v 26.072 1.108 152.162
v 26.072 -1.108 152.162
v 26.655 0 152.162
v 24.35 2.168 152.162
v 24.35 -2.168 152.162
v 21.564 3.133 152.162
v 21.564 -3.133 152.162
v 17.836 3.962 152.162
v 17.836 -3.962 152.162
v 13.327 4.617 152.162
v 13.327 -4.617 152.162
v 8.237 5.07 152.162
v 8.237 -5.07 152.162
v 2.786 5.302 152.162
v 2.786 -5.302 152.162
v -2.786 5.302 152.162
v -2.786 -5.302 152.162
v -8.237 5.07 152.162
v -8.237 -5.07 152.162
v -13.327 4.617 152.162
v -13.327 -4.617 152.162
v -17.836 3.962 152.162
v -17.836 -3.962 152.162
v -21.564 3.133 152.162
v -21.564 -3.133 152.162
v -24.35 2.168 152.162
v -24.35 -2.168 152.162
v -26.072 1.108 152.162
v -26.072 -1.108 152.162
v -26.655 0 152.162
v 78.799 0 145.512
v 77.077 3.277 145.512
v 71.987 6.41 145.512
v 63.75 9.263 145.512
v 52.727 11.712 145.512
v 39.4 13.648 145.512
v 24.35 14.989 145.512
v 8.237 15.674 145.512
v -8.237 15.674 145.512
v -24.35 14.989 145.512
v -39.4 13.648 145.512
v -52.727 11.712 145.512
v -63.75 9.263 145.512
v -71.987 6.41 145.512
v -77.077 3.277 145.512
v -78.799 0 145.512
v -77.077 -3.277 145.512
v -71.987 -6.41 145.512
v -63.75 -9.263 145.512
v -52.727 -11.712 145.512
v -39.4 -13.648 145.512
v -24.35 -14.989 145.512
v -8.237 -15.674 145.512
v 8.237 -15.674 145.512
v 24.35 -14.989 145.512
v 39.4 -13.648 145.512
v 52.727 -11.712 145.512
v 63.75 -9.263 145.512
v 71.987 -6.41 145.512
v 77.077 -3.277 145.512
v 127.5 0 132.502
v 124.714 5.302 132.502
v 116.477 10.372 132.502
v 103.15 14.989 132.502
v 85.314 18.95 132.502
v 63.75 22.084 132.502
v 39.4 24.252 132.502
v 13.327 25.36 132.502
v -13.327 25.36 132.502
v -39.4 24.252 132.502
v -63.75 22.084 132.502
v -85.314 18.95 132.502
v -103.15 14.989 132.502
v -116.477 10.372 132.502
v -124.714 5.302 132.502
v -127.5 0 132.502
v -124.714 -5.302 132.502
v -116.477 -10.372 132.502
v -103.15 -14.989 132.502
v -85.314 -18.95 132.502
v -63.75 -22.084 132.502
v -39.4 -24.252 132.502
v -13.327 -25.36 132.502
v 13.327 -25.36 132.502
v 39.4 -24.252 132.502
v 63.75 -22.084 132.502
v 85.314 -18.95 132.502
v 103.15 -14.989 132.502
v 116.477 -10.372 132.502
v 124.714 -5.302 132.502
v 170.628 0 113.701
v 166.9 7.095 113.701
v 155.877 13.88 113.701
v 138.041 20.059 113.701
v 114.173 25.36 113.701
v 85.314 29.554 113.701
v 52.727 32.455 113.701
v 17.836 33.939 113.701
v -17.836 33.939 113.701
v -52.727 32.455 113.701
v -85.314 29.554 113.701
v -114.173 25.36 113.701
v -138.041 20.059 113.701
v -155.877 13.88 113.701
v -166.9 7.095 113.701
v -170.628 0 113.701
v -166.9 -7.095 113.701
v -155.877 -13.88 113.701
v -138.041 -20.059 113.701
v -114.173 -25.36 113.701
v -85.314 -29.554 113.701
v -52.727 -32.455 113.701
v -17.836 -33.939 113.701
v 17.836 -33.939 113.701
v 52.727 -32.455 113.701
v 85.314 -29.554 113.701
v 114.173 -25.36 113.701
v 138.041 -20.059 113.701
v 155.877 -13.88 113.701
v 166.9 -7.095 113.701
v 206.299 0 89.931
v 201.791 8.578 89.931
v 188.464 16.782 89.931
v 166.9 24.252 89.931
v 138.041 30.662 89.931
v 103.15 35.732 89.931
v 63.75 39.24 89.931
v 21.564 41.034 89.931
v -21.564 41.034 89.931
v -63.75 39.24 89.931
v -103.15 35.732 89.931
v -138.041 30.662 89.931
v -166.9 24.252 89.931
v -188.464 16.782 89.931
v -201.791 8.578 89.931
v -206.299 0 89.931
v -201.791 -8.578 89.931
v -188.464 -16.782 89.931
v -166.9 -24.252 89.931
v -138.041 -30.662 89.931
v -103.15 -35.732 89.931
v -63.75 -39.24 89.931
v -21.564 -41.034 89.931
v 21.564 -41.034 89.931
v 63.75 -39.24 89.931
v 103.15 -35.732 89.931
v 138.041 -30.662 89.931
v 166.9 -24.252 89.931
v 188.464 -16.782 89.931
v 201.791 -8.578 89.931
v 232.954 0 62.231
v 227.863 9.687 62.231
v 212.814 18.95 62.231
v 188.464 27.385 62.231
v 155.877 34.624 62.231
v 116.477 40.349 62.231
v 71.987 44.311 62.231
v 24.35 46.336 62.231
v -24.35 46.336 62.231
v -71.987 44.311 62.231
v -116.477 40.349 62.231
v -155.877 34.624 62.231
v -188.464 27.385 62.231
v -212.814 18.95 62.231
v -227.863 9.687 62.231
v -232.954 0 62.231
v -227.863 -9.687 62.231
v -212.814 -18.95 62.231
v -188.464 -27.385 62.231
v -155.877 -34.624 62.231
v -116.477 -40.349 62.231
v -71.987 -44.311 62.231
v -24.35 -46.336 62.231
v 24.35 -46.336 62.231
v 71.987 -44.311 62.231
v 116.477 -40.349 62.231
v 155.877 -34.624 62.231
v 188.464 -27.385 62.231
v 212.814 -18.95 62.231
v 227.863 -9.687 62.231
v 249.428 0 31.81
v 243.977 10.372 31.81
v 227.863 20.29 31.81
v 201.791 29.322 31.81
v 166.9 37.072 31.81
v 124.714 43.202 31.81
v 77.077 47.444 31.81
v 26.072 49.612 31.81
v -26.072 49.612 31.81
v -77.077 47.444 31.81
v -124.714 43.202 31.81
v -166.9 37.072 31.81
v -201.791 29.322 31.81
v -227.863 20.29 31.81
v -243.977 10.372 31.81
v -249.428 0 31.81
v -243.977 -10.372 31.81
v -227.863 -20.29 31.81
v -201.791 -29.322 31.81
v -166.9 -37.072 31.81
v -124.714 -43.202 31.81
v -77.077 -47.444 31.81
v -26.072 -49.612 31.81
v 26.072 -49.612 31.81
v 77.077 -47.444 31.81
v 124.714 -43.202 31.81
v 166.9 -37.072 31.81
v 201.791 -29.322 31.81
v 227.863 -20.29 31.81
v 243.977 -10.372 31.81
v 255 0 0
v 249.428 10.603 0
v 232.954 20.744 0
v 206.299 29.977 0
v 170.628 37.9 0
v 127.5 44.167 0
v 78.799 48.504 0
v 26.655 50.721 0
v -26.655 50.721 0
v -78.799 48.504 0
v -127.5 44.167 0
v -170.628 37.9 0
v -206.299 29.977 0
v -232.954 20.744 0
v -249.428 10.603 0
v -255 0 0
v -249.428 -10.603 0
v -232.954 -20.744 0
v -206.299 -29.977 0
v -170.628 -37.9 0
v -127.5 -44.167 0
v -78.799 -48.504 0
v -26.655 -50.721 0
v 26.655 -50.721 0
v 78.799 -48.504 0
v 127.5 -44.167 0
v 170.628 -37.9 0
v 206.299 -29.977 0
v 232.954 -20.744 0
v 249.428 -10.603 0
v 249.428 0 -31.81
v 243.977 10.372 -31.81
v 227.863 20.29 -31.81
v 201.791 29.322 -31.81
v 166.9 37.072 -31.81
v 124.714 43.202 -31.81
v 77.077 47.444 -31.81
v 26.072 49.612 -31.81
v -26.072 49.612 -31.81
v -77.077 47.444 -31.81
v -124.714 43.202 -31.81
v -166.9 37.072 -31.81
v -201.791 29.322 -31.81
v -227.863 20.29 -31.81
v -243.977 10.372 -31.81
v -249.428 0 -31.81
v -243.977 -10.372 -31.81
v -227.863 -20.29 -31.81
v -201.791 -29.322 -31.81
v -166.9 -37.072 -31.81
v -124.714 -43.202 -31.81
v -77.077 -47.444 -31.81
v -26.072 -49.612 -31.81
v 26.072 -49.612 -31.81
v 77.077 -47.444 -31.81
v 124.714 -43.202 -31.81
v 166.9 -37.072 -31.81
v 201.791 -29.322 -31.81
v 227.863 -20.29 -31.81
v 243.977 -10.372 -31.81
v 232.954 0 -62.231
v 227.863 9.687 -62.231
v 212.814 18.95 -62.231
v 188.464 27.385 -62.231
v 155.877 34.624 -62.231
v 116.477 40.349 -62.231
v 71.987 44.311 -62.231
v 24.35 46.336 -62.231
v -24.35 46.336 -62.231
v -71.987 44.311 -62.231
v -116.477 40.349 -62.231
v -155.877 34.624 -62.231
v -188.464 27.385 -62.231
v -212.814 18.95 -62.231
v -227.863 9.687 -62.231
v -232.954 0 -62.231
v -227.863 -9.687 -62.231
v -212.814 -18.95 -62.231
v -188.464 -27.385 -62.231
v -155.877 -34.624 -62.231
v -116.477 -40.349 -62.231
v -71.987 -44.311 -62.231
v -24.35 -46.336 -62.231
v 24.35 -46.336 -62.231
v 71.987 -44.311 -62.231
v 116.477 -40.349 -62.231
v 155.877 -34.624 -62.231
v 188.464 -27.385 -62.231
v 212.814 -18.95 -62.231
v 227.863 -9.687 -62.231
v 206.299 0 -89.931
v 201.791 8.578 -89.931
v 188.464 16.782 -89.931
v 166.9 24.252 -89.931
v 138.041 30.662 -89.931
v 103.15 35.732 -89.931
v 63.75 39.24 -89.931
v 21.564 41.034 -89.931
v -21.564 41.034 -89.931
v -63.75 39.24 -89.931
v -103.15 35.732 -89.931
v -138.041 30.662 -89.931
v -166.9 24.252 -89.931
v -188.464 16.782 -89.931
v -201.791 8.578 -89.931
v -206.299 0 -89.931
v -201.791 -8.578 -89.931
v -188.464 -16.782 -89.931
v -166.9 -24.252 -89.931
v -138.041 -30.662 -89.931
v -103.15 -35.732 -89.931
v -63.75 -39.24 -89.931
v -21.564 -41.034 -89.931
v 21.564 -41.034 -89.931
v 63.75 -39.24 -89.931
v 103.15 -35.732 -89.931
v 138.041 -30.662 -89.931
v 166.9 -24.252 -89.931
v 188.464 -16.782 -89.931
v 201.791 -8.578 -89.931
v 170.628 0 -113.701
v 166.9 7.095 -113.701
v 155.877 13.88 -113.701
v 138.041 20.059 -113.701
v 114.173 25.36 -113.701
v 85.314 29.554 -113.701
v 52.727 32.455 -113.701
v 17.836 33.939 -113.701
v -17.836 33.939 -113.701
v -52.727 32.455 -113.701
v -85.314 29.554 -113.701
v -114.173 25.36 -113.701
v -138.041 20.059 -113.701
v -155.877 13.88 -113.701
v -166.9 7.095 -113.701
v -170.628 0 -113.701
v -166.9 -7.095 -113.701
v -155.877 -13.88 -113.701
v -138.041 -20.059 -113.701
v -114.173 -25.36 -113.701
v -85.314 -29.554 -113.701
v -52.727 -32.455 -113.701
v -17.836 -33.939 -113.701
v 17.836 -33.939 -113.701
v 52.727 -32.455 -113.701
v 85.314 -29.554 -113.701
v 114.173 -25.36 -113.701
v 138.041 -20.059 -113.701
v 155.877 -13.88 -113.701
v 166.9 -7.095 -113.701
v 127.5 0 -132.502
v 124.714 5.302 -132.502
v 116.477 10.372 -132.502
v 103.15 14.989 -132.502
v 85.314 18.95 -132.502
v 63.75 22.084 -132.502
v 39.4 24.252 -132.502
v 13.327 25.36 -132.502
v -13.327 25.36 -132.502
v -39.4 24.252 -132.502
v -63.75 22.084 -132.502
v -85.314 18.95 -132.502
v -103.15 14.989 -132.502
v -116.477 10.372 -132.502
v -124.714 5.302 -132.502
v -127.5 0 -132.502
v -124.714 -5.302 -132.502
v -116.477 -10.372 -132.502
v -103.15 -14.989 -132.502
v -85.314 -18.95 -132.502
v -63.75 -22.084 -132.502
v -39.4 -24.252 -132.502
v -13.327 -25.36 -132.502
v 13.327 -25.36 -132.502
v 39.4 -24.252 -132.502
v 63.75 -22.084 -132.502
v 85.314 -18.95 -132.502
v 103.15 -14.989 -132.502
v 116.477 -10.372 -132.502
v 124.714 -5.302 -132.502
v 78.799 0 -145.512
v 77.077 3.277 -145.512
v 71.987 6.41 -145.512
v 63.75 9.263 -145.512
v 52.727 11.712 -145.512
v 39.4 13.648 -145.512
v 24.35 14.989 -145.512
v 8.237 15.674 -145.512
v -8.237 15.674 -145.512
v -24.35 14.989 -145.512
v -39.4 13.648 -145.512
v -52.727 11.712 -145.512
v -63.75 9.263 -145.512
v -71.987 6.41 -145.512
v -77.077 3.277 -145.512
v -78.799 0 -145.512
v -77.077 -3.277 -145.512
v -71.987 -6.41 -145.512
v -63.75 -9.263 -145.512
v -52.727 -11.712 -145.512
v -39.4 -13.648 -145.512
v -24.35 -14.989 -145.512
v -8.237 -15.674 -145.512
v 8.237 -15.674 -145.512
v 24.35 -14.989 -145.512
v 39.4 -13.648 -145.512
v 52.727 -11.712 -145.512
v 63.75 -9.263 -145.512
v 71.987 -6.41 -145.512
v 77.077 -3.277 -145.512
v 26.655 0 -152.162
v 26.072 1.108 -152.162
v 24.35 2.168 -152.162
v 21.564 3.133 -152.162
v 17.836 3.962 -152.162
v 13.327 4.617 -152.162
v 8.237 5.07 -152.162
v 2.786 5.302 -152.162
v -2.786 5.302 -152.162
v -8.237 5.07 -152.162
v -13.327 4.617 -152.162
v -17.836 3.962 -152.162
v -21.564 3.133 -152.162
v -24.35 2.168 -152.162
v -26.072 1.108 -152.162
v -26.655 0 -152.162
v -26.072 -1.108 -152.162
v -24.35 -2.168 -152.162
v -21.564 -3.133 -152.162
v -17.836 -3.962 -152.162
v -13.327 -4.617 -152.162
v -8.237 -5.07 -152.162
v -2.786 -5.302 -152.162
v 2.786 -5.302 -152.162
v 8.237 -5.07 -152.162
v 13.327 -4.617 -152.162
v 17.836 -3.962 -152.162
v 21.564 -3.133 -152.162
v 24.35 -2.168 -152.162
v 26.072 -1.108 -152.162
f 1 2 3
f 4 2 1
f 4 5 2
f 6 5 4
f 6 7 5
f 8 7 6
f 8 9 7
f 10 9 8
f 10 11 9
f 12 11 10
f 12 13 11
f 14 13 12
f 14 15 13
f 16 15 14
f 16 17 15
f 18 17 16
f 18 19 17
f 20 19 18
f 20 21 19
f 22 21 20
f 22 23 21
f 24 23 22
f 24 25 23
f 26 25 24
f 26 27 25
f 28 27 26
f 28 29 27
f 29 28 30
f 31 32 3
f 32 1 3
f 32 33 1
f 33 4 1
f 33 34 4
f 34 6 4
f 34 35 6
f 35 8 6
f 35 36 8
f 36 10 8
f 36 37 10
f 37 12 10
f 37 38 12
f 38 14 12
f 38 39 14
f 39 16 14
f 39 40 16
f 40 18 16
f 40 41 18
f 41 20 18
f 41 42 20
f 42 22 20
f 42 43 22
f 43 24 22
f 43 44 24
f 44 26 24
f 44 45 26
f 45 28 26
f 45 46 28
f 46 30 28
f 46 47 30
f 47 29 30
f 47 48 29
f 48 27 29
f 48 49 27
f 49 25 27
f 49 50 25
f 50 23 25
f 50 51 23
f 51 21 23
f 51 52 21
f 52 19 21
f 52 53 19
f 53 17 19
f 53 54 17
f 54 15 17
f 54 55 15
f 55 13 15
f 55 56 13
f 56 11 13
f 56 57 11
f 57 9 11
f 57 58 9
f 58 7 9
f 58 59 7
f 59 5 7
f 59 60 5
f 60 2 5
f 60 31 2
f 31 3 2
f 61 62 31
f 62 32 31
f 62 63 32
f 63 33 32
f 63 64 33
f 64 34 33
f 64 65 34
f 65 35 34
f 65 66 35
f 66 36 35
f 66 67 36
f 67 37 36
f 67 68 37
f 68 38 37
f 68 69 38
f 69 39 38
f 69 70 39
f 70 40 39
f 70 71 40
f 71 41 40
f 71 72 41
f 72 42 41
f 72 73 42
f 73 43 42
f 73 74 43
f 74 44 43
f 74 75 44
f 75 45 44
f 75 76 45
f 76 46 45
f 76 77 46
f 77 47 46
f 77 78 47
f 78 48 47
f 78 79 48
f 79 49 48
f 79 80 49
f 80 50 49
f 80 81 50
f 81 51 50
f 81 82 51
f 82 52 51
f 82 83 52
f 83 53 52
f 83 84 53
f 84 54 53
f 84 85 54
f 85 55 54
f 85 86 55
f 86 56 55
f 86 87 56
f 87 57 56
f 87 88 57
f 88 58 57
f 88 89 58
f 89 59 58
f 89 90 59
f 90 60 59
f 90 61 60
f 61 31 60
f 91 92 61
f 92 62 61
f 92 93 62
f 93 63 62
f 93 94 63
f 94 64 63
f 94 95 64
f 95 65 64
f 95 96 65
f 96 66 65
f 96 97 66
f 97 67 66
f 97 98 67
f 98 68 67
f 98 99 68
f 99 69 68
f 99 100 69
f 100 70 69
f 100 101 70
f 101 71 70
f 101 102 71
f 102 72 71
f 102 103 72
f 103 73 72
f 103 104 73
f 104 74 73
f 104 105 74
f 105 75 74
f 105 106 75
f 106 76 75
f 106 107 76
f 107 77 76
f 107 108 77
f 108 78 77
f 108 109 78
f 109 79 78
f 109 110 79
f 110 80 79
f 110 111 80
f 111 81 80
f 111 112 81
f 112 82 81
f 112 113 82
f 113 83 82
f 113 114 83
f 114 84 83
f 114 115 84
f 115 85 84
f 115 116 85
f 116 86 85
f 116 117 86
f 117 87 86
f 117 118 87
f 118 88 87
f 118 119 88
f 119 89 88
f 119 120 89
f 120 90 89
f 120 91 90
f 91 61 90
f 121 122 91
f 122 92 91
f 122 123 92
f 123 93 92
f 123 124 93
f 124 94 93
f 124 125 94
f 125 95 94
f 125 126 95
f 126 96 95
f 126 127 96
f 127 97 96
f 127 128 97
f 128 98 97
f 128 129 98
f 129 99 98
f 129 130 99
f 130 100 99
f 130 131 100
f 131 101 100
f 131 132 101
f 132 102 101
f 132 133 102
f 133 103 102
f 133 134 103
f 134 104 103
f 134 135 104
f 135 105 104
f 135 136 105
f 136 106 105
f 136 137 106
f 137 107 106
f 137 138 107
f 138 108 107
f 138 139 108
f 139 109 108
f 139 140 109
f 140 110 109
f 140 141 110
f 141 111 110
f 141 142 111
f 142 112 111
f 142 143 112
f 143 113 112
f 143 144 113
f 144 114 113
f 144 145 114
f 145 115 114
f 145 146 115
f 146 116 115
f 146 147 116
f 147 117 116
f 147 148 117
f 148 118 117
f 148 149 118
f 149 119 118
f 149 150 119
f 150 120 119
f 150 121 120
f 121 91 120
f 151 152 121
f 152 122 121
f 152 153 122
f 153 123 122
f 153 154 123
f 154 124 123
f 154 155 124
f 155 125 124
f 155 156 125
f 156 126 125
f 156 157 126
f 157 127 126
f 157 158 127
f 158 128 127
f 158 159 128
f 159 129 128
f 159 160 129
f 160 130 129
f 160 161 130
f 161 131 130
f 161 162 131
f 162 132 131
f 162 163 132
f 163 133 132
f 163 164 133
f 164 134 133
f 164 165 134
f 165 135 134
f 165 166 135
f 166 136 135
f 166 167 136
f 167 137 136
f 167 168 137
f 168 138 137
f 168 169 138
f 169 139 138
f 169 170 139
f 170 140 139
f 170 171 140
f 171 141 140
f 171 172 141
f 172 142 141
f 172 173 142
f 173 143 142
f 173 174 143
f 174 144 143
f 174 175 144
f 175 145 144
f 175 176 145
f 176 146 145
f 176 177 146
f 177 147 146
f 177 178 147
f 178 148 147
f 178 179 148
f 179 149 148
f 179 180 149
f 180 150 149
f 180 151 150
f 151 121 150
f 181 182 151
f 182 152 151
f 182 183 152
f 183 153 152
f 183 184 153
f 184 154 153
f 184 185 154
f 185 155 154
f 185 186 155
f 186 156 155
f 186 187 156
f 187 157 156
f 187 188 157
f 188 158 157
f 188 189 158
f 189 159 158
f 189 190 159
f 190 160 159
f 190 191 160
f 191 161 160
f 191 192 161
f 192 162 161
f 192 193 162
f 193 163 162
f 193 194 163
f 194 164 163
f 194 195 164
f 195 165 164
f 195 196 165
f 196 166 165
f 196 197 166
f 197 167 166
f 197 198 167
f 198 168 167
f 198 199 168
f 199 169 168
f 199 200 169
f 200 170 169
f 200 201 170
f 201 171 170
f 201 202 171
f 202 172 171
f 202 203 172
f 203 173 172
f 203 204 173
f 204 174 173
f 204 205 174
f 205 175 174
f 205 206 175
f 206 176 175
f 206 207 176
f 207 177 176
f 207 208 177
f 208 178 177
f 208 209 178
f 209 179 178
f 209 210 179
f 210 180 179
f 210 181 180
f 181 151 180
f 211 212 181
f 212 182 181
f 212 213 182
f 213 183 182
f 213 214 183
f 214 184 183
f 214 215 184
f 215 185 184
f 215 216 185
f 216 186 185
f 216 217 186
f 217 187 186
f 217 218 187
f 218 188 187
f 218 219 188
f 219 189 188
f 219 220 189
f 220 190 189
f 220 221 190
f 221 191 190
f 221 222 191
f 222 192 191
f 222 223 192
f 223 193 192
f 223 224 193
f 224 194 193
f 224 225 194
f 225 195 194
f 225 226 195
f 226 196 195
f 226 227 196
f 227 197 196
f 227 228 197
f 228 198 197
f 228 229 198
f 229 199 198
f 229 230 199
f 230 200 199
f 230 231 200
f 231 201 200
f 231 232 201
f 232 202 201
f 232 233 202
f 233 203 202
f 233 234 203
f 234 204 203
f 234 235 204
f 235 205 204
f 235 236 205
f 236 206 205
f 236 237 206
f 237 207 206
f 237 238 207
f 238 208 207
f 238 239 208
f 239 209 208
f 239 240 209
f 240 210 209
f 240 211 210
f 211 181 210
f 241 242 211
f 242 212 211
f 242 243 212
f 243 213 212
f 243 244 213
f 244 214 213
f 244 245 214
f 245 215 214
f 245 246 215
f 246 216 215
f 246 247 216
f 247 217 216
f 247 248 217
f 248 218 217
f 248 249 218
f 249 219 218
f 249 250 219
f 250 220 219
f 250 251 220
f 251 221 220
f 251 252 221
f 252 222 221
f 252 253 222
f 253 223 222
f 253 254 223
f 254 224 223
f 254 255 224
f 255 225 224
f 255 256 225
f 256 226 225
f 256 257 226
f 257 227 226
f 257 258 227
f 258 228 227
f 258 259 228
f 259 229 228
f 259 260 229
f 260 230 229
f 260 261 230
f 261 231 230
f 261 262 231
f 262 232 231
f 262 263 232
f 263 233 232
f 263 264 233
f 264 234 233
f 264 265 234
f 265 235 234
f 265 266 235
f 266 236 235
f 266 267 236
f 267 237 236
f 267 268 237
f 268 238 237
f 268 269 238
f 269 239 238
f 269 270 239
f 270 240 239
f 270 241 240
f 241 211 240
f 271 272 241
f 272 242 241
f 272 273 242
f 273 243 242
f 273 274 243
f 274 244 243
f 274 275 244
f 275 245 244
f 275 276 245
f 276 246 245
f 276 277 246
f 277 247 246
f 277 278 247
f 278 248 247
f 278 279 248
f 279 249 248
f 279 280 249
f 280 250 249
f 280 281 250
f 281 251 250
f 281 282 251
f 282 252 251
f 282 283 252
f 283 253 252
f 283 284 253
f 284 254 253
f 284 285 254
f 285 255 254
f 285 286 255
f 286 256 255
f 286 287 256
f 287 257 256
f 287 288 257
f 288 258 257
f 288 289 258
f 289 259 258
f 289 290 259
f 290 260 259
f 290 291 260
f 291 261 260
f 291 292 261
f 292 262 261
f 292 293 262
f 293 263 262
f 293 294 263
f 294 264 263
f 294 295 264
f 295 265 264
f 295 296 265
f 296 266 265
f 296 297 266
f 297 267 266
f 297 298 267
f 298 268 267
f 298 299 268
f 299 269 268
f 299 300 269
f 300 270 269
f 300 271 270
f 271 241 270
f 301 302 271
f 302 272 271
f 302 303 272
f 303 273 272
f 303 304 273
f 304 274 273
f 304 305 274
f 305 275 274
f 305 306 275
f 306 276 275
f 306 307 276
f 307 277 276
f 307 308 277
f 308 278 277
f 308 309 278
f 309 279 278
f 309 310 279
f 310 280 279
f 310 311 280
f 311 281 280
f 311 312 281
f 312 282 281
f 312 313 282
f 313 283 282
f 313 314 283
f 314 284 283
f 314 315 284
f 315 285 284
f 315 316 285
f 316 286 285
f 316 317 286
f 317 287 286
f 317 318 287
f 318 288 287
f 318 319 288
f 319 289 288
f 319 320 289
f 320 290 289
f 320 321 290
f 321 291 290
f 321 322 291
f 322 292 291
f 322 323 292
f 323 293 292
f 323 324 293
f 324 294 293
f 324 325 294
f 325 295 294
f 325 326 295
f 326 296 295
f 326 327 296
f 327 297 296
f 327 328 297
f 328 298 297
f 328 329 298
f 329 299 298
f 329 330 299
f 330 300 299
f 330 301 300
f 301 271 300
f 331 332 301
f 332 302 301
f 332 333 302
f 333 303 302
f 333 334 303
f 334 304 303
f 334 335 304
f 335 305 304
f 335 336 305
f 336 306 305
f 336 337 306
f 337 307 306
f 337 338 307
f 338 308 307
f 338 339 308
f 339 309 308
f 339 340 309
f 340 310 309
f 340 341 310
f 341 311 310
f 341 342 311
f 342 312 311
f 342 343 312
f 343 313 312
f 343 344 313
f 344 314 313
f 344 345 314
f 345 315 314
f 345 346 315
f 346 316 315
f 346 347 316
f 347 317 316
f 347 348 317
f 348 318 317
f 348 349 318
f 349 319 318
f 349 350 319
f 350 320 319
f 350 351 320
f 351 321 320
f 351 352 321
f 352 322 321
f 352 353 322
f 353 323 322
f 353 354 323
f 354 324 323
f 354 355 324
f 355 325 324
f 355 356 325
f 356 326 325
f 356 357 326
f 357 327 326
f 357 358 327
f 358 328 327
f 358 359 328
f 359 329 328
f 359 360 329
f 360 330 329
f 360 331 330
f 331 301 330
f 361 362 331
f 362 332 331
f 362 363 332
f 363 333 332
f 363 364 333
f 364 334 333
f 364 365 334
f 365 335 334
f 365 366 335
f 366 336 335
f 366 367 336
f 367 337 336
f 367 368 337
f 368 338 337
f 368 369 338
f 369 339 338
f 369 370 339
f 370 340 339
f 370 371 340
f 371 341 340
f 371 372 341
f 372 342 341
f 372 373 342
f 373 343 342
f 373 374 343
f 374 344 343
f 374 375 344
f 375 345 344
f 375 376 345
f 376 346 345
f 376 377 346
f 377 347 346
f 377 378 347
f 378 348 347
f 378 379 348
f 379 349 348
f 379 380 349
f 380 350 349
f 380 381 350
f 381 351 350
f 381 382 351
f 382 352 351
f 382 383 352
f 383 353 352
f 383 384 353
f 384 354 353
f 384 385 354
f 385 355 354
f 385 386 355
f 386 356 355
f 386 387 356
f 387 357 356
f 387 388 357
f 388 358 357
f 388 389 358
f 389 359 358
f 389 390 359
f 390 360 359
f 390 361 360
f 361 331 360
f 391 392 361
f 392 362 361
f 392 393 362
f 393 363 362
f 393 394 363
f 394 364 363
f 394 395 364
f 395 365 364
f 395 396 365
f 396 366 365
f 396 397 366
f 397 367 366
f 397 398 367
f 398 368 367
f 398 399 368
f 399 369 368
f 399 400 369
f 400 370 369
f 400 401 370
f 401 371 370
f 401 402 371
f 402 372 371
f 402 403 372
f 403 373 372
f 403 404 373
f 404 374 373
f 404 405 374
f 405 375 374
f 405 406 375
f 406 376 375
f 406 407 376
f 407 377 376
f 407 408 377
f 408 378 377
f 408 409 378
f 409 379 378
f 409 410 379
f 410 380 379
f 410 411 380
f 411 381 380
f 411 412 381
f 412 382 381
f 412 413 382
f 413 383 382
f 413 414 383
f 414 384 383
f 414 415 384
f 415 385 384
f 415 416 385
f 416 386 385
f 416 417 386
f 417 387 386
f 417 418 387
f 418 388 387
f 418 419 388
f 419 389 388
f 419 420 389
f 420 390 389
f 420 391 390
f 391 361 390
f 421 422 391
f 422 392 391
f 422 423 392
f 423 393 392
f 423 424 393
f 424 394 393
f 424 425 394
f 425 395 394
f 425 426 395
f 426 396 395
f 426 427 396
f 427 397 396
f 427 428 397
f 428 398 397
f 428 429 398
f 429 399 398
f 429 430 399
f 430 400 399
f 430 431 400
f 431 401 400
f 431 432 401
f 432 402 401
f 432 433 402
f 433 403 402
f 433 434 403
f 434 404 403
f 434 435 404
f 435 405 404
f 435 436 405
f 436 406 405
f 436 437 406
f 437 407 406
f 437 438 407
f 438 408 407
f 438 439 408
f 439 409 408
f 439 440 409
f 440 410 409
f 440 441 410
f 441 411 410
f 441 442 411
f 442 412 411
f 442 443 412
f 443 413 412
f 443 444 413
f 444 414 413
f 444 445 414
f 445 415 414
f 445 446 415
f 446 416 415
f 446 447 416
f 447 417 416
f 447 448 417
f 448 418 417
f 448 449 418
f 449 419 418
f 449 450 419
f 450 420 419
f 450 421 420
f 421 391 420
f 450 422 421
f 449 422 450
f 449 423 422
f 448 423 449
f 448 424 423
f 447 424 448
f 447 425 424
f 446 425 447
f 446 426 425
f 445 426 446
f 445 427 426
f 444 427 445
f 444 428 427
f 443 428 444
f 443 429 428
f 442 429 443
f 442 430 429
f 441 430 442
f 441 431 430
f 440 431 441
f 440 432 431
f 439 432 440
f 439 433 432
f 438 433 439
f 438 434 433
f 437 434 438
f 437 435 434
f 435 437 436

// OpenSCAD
// Generated by SolidPython 1.0.1 on 2020-07-29 00:46:51


scale(v = [15, 3, 9]) {
	sphere(r = 17);
}
/***********************************************
*********      SolidPython code:      **********
************************************************
 
# import packages: SolidPython
from solid import *
from solid.utils import *
from itertools import chain, combinations, permutations


class Resize:

    def __init__(self, scad_file):
        self.scad_file = scad_file
        #self.scad_file = import_scad(scad_file)
        # cone/cylinder param:
        self.r1 = 0
        self.r2 = 0
        self.h = 0
        # rectangular prism param:
        self.w = 0
        self.l = 0
        # ellipse param:
        self.r = 0

    # import OpenScad code (file name corresponds to shape)


    # classify shape + parameters
    def assign(self, param1, param2, param3):
        if self.scad_file == 'cone.scad':
            self.r1 = param1
            self.r2 = param2
            self.h = param3
        elif self.scad_file == 'cylinder.scad':
            self.r1 = param1
            self.r2 = param2
            self.h = param3
        elif self.scad_file == 'rectangularPrism.scad':
            self.h = param1
            self.l = param2
            self.w = param3
        else:
            self.r = param1
            self.h = param2

    # resize parameters
    def iterate(self):
        x = range(3, 20, 2)
        i = 1
        if self.scad_file == 'cone.scad':
            tempList = list(permutations(x, 2))
            for temp in tempList:
                param1 = temp[0]
                param2 = temp[1]
                filepath = 'produced_scad_files/' + 'cone' + str(param1) + '_' + str(param2) + '_' + '.scad'
                scad_render_to_file(cylinder(h=param1, r1=param2, r2=0), filepath)

        elif self.scad_file == 'cylinder.scad':
            tempList = list(permutations(x, 3))
            for temp in tempList:
                param1 = temp[0]
                param2 = temp[1]
                filepath = 'produced_scad_files/' + 'cylinder' + str(param1) + '_' + str(param2) + '_' + '.scad'
                scad_render_to_file(cylinder(h=param1, r1=param2, r2=param2), filepath)

        elif self.scad_file == 'rectangularPrism.scad':
            tempList = list(permutations(x, 3))
            for temp in tempList:
                param1 = temp[0]
                param2 = temp[1]
                param3 = temp[2]
                filepath = 'produced_scad_files/' + 'rectangularPrism' + str(param1) + '_' + str(param2) + '_' + str(
                    param3) + '.scad'
                scad_render_to_file(cube(size=(param1, param2, param3)), filepath)

        elif self.scad_file == 'ellipse.scad':
            tempList = list(permutations(x, 4))
            for temp in tempList:
                param1 = temp[0]
                param2 = temp[1]
                param3 = temp[2]
                param4 = temp[3]
                filepath = 'produced_scad_files/' + 'ellipse' + str(param1) + '_' + str(param2) + '_' + str(param3) + '_' + str(param4) + '.scad'
                scad_render_to_file(scale([param1, param2, param3])(sphere(r=param4)), filepath)

    def render_to_scadfile(self):
        scad_render_to_file(scad, 'example.scad') 
 
************************************************/
